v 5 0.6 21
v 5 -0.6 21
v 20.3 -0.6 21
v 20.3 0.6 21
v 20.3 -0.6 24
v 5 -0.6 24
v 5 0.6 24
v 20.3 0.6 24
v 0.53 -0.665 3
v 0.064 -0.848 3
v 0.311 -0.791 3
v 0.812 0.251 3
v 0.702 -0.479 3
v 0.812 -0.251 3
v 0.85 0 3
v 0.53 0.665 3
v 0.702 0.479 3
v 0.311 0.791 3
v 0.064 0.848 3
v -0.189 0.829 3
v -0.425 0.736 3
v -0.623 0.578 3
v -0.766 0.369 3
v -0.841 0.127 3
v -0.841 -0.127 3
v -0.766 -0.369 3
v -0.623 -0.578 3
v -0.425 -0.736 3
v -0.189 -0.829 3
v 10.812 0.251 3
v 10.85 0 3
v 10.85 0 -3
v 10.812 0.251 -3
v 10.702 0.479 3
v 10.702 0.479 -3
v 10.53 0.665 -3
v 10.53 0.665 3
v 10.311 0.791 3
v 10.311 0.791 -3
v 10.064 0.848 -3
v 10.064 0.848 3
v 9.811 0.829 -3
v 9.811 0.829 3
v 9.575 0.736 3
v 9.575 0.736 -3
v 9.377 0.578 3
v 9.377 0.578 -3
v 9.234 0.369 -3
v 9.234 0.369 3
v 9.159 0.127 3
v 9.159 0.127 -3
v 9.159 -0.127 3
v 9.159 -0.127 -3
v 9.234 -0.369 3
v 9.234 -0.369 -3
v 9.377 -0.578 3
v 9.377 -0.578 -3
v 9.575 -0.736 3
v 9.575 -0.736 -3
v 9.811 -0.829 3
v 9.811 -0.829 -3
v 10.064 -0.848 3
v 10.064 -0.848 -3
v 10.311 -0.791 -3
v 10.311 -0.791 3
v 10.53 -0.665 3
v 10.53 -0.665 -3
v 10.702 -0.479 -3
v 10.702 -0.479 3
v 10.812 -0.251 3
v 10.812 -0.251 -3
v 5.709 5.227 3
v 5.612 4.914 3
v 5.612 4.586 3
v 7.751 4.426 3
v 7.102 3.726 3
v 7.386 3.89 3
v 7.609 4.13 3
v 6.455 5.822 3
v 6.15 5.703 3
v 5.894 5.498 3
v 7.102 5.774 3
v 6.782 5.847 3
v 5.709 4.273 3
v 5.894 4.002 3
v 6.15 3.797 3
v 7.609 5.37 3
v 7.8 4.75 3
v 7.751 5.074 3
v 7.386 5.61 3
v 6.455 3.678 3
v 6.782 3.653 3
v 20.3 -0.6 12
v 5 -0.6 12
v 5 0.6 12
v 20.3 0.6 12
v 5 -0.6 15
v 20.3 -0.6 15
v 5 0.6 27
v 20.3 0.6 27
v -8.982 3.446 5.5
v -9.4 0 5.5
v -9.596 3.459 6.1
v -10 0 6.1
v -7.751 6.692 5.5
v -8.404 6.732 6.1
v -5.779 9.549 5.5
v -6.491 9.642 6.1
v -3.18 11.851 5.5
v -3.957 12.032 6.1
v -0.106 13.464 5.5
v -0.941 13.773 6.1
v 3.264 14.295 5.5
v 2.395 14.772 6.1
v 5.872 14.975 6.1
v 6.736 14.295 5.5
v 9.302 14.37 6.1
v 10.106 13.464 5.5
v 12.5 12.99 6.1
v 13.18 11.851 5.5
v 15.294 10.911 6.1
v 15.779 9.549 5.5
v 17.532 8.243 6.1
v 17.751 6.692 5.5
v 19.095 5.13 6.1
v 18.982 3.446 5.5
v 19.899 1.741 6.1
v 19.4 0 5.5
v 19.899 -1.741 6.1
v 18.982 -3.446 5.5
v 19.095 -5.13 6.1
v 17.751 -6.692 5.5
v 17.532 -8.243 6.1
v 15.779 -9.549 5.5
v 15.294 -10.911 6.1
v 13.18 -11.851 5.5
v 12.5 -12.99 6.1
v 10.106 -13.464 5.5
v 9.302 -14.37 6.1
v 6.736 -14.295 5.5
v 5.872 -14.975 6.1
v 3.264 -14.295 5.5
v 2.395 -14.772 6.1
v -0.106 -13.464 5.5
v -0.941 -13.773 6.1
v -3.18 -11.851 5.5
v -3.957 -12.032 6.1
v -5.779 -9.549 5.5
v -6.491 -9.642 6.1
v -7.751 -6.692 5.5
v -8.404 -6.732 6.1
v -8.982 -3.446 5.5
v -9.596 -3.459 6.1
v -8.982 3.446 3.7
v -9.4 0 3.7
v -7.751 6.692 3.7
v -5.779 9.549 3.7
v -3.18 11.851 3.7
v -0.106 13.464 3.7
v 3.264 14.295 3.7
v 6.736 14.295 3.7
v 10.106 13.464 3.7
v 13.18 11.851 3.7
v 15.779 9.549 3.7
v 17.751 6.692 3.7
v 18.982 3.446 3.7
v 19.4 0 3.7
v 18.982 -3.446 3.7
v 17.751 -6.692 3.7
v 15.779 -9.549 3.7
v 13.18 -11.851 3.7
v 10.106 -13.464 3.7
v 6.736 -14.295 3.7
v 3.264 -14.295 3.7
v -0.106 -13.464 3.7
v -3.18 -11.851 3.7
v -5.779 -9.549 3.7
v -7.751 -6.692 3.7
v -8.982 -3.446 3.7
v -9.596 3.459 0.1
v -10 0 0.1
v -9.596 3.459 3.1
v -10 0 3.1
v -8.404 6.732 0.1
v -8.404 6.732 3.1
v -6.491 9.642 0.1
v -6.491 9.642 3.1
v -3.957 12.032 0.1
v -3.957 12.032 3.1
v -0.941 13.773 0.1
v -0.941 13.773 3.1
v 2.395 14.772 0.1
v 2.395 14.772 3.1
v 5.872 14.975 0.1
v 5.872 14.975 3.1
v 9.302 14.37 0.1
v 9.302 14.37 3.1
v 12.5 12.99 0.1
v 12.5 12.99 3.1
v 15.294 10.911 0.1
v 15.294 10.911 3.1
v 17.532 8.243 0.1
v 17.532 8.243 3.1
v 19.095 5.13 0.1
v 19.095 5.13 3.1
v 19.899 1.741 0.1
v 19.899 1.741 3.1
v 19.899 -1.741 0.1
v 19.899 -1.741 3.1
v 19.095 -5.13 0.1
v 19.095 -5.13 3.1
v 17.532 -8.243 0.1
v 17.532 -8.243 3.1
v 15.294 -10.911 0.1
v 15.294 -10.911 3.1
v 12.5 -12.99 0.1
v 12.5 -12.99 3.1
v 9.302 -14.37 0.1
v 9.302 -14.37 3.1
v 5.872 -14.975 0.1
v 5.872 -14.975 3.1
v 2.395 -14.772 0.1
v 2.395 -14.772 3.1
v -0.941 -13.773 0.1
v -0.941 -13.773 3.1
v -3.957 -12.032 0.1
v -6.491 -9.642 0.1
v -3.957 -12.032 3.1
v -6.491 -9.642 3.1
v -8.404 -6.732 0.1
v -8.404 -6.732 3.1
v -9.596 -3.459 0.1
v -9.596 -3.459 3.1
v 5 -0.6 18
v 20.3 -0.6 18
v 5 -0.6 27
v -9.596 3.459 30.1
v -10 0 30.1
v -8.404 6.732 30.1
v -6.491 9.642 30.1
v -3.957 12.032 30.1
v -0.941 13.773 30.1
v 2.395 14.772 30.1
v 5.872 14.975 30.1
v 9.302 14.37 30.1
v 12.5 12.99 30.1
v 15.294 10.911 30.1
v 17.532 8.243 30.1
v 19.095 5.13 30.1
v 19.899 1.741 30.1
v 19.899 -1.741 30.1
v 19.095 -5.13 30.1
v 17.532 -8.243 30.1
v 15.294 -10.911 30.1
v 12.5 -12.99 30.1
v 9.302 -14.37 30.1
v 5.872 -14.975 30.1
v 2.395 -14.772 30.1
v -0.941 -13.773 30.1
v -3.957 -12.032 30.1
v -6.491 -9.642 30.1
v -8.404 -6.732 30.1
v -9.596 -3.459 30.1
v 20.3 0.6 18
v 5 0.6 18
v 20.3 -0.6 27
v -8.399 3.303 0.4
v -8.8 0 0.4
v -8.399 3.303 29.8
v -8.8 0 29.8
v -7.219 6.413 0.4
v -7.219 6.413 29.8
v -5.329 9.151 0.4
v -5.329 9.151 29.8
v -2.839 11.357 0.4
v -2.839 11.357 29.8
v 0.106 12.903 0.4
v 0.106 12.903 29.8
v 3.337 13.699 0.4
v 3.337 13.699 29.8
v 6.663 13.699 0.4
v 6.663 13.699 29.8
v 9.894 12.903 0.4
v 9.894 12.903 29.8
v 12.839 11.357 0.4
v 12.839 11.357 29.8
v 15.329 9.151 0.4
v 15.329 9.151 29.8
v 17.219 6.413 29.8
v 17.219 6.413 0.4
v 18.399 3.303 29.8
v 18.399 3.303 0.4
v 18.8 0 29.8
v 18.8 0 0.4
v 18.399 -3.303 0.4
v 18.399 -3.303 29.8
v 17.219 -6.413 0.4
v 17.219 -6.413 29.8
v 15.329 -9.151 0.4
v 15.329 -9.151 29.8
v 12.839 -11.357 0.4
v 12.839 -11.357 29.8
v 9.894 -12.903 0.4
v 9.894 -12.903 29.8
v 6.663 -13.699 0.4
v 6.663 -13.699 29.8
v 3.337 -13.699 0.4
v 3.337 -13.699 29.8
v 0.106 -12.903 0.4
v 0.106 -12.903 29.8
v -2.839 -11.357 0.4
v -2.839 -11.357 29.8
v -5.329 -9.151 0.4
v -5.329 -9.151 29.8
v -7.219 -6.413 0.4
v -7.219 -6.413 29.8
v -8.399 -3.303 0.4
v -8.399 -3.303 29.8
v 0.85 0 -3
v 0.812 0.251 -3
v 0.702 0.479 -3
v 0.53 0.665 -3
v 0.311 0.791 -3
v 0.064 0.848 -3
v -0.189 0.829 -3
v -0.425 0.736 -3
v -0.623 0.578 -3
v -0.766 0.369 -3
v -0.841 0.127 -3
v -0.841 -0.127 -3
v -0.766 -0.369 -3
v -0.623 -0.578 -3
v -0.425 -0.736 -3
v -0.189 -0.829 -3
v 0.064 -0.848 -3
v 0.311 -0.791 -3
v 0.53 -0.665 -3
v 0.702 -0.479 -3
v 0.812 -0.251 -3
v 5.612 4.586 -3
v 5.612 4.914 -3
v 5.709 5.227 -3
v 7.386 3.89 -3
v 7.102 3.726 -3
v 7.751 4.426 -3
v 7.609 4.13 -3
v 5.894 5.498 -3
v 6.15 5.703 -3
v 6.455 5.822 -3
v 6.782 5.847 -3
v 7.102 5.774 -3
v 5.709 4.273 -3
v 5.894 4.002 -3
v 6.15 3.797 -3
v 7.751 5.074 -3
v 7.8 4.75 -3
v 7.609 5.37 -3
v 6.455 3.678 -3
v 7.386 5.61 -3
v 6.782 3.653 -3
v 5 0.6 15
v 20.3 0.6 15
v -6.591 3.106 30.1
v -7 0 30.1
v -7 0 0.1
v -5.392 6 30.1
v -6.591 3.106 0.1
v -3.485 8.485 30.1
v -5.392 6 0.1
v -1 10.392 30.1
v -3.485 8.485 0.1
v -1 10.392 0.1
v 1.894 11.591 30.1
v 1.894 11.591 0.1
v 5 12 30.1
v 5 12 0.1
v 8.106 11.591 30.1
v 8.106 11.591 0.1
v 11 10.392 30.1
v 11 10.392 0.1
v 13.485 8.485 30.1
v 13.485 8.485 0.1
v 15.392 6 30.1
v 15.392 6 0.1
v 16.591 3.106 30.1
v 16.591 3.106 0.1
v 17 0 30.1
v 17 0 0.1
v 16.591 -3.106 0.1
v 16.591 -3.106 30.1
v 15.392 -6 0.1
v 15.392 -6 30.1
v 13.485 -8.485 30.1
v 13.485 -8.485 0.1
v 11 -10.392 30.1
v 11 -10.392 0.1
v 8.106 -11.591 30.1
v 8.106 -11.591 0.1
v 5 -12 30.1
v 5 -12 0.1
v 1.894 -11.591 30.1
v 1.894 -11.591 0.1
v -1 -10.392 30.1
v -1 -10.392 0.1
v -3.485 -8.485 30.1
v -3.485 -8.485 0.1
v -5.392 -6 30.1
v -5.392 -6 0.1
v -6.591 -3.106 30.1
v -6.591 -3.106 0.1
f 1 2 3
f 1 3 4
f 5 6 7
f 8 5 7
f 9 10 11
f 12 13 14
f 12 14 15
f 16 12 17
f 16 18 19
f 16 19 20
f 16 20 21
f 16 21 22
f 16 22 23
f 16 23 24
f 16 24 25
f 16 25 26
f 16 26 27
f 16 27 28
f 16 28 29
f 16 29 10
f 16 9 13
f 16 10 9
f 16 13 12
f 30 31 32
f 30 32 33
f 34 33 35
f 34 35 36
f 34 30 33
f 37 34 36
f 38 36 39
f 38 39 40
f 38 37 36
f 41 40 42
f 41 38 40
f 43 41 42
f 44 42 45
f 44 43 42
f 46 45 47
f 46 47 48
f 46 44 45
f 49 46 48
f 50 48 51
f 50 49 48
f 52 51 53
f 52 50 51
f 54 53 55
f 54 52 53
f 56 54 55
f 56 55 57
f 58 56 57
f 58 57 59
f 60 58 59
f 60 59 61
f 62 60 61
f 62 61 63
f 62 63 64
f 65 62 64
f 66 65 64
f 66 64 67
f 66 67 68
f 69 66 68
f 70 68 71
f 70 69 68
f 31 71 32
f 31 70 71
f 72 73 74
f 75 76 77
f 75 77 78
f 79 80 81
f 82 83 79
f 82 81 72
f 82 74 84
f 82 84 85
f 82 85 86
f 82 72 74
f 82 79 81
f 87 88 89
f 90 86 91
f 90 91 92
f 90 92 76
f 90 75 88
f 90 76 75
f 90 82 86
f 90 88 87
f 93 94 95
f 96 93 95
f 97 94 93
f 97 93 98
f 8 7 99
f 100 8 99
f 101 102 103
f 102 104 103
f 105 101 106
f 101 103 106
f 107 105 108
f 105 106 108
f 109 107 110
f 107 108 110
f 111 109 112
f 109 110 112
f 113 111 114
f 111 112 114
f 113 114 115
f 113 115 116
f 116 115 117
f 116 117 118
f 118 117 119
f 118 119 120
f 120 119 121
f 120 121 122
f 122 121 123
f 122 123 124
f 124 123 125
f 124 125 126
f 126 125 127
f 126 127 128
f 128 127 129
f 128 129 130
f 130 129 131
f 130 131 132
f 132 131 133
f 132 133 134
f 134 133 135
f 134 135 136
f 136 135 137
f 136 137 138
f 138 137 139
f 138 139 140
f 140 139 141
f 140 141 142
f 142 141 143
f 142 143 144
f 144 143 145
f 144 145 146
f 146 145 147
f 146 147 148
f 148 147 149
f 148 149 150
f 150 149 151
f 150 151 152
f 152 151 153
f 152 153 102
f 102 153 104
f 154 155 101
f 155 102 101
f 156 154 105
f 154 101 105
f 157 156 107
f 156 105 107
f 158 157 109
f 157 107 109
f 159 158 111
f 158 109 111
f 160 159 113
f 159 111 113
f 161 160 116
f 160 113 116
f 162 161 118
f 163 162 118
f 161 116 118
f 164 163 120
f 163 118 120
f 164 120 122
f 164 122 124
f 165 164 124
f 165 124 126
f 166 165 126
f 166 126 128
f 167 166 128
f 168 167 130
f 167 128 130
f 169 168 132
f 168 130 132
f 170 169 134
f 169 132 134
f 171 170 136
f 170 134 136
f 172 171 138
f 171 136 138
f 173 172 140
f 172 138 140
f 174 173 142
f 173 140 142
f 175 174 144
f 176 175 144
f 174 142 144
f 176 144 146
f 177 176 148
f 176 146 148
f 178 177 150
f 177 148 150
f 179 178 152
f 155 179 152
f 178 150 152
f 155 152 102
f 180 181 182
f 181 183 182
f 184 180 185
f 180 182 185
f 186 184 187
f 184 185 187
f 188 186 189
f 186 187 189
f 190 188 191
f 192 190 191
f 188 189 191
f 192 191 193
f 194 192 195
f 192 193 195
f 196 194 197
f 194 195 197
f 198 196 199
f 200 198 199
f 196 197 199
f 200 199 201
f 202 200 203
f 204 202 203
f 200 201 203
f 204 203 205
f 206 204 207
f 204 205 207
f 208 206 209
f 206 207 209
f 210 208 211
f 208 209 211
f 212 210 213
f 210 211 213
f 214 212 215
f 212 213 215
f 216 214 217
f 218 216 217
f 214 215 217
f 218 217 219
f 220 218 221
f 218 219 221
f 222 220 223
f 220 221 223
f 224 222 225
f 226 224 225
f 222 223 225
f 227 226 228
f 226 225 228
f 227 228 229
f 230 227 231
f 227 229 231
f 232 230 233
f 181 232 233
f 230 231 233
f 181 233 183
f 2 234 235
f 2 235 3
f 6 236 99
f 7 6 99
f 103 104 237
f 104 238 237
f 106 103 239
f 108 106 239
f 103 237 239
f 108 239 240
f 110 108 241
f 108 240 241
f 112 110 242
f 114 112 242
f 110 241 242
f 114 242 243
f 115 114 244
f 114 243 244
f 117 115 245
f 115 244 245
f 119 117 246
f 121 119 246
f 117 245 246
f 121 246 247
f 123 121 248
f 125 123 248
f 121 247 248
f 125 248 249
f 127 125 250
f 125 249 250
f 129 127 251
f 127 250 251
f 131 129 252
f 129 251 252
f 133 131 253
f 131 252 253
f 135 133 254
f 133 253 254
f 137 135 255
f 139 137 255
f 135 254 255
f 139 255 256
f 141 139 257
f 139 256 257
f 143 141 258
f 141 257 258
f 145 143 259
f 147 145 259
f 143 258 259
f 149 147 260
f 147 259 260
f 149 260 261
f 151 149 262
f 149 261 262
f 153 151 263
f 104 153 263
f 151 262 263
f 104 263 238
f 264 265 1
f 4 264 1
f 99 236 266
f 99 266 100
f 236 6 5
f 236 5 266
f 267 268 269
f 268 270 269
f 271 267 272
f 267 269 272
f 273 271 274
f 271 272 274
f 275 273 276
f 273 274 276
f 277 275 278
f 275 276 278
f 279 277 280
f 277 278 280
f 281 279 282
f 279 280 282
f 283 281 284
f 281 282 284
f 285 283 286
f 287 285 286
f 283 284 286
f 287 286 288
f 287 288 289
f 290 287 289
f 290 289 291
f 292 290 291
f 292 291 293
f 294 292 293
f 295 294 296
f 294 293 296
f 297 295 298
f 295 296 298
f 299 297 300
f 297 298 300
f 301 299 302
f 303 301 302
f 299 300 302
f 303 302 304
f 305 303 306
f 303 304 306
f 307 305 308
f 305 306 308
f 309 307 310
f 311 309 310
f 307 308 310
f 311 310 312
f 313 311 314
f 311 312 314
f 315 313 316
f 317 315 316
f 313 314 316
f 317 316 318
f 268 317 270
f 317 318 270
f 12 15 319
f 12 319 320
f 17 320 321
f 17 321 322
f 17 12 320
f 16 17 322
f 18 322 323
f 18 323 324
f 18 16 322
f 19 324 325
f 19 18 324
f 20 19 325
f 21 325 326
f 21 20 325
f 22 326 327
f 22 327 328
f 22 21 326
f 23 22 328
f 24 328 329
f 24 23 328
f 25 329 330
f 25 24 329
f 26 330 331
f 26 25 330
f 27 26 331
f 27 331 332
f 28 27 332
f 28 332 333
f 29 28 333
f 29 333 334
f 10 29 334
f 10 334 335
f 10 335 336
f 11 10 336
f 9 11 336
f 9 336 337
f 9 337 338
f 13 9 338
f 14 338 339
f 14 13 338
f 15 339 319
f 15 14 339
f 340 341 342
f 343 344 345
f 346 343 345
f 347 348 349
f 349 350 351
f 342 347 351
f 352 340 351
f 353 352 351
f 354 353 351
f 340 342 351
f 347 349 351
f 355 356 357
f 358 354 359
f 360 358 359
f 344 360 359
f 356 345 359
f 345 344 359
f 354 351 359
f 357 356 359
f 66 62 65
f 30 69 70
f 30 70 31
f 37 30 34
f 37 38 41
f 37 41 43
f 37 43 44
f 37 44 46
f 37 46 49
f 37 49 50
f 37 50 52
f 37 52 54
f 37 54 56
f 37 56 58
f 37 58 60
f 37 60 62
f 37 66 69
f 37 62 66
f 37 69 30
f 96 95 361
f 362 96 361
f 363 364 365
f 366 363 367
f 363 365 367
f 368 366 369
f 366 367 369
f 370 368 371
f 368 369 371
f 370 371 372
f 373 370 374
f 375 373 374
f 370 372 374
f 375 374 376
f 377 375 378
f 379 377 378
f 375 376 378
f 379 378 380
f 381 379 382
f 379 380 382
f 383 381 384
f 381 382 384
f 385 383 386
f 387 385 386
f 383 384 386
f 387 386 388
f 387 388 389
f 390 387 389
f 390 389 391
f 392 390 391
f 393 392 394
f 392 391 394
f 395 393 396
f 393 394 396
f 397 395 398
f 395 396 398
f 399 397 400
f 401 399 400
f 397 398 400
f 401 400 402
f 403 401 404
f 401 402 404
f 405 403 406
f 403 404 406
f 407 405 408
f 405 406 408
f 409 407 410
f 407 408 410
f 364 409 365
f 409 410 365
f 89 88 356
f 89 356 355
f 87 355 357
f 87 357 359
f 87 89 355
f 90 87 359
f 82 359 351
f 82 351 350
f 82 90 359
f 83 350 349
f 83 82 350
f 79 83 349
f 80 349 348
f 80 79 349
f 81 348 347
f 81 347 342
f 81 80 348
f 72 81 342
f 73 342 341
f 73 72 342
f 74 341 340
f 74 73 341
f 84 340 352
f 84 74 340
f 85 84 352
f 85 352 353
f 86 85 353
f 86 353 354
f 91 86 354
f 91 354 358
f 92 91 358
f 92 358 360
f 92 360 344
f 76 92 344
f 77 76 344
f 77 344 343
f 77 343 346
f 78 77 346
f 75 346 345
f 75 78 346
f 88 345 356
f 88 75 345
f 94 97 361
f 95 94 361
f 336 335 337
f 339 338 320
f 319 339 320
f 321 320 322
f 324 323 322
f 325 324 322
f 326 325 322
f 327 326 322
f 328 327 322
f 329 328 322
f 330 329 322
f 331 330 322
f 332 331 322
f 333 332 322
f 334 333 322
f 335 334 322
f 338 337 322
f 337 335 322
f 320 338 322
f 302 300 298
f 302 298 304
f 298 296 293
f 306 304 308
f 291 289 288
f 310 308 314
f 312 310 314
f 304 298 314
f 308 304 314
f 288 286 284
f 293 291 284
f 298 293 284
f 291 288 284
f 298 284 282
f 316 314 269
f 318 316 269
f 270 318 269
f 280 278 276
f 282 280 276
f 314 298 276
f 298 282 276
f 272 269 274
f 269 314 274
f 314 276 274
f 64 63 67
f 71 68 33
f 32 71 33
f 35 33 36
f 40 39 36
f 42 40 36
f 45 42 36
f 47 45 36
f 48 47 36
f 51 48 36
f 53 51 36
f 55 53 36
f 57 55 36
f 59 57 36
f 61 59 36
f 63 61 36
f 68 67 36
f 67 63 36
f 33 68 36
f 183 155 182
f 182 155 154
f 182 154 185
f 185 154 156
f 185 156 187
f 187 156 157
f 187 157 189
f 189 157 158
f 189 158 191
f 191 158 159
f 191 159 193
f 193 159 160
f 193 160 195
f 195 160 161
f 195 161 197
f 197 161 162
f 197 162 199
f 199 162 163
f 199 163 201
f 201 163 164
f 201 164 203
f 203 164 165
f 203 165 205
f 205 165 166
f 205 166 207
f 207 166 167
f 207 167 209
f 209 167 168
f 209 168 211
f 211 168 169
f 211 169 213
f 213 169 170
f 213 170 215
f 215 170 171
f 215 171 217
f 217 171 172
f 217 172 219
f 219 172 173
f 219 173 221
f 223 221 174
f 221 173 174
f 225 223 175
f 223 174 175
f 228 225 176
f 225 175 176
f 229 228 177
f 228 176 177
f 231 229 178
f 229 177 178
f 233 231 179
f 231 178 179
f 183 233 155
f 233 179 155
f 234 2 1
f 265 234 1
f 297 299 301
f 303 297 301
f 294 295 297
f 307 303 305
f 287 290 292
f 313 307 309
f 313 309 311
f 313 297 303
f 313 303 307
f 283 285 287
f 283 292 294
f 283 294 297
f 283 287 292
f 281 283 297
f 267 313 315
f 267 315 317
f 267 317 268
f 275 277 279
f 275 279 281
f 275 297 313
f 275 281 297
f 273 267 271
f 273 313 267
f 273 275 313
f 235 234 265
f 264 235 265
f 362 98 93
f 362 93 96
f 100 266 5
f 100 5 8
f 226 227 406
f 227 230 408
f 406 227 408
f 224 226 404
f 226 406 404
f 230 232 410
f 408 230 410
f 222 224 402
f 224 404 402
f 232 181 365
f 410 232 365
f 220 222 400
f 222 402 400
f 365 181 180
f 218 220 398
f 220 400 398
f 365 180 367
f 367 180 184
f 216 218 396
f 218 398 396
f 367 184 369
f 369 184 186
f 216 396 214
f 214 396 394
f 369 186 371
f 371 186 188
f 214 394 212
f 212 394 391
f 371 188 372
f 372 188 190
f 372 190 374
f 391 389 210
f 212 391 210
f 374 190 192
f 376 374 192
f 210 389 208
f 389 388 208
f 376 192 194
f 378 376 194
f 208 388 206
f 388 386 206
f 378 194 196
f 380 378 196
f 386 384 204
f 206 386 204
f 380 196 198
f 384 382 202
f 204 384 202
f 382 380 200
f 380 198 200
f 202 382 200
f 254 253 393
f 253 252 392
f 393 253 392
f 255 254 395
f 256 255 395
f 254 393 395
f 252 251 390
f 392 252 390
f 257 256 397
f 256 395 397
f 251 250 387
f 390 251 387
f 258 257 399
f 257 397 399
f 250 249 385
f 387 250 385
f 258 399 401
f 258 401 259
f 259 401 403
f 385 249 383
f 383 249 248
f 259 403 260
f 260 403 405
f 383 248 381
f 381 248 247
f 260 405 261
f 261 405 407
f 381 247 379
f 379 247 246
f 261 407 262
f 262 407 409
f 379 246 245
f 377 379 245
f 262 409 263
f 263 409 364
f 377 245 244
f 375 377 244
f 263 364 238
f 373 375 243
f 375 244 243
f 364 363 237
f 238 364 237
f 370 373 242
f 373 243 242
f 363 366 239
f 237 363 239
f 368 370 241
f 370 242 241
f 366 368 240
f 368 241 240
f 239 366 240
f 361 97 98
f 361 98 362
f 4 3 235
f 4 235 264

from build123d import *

# Parameters (mm, degrees)
SKETCH002_W   = 13.8
SKETCH002_H   = 29.4
SKETCH003_R   = 0.85
SKETCH003_R_2 = 1.1
PAD_DEPTH     = 6
SKETCH004_W   = 1.2
SKETCH004_H   = 3
PAD001_DEPTH  = 15.3


with BuildPart() as revolution:
    # Sketch → Revolution (revolve)
    with BuildSketch(Plane.XZ):
        Polygon((-10, 0.1), (-10, 3.1), (-9.4, 3.7), (-9.4, 5.5), (-10, 6.1), (-10, 30.1), (-7, 30.1), (-7, 0.1), align=None)
    revolve(axis=Axis((5, 0, 7.548619), (0, 0, -1)))


with BuildPart() as revolution001:
    # Sketch002 → Revolution001 (revolve)
    with BuildSketch(Plane.XZ):
        with Locations((-1.9, 15.1)):
            Rectangle(SKETCH002_W, SKETCH002_H)
    revolve(axis=Axis((5, 0, 4.680116), (0, 0, -1)))


with BuildPart() as pad:
    # Sketch003 → Pad (new body)
    with BuildSketch(Plane.XY.offset(3)):
        Circle(SKETCH003_R)
        with Locations((10, 0)):
            Circle(SKETCH003_R)
        with Locations((6.7, 4.75)):
            Circle(SKETCH003_R_2)
    extrude(amount=-PAD_DEPTH)


with BuildPart() as pad001:
    # Sketch004 → Pad001 (new body)
    with BuildSketch(Plane.YZ.offset(5)):
        with Locations((0, 13.5)):
            Rectangle(SKETCH004_W, SKETCH004_H)
        with Locations((0, 19.5)):
            Rectangle(SKETCH004_W, SKETCH004_H)
        with Locations((0, 25.5)):
            Rectangle(SKETCH004_W, SKETCH004_H)
    extrude(amount=PAD001_DEPTH)


solid = Compound([revolution.part, revolution001.part, pad.part, pad001.part])
